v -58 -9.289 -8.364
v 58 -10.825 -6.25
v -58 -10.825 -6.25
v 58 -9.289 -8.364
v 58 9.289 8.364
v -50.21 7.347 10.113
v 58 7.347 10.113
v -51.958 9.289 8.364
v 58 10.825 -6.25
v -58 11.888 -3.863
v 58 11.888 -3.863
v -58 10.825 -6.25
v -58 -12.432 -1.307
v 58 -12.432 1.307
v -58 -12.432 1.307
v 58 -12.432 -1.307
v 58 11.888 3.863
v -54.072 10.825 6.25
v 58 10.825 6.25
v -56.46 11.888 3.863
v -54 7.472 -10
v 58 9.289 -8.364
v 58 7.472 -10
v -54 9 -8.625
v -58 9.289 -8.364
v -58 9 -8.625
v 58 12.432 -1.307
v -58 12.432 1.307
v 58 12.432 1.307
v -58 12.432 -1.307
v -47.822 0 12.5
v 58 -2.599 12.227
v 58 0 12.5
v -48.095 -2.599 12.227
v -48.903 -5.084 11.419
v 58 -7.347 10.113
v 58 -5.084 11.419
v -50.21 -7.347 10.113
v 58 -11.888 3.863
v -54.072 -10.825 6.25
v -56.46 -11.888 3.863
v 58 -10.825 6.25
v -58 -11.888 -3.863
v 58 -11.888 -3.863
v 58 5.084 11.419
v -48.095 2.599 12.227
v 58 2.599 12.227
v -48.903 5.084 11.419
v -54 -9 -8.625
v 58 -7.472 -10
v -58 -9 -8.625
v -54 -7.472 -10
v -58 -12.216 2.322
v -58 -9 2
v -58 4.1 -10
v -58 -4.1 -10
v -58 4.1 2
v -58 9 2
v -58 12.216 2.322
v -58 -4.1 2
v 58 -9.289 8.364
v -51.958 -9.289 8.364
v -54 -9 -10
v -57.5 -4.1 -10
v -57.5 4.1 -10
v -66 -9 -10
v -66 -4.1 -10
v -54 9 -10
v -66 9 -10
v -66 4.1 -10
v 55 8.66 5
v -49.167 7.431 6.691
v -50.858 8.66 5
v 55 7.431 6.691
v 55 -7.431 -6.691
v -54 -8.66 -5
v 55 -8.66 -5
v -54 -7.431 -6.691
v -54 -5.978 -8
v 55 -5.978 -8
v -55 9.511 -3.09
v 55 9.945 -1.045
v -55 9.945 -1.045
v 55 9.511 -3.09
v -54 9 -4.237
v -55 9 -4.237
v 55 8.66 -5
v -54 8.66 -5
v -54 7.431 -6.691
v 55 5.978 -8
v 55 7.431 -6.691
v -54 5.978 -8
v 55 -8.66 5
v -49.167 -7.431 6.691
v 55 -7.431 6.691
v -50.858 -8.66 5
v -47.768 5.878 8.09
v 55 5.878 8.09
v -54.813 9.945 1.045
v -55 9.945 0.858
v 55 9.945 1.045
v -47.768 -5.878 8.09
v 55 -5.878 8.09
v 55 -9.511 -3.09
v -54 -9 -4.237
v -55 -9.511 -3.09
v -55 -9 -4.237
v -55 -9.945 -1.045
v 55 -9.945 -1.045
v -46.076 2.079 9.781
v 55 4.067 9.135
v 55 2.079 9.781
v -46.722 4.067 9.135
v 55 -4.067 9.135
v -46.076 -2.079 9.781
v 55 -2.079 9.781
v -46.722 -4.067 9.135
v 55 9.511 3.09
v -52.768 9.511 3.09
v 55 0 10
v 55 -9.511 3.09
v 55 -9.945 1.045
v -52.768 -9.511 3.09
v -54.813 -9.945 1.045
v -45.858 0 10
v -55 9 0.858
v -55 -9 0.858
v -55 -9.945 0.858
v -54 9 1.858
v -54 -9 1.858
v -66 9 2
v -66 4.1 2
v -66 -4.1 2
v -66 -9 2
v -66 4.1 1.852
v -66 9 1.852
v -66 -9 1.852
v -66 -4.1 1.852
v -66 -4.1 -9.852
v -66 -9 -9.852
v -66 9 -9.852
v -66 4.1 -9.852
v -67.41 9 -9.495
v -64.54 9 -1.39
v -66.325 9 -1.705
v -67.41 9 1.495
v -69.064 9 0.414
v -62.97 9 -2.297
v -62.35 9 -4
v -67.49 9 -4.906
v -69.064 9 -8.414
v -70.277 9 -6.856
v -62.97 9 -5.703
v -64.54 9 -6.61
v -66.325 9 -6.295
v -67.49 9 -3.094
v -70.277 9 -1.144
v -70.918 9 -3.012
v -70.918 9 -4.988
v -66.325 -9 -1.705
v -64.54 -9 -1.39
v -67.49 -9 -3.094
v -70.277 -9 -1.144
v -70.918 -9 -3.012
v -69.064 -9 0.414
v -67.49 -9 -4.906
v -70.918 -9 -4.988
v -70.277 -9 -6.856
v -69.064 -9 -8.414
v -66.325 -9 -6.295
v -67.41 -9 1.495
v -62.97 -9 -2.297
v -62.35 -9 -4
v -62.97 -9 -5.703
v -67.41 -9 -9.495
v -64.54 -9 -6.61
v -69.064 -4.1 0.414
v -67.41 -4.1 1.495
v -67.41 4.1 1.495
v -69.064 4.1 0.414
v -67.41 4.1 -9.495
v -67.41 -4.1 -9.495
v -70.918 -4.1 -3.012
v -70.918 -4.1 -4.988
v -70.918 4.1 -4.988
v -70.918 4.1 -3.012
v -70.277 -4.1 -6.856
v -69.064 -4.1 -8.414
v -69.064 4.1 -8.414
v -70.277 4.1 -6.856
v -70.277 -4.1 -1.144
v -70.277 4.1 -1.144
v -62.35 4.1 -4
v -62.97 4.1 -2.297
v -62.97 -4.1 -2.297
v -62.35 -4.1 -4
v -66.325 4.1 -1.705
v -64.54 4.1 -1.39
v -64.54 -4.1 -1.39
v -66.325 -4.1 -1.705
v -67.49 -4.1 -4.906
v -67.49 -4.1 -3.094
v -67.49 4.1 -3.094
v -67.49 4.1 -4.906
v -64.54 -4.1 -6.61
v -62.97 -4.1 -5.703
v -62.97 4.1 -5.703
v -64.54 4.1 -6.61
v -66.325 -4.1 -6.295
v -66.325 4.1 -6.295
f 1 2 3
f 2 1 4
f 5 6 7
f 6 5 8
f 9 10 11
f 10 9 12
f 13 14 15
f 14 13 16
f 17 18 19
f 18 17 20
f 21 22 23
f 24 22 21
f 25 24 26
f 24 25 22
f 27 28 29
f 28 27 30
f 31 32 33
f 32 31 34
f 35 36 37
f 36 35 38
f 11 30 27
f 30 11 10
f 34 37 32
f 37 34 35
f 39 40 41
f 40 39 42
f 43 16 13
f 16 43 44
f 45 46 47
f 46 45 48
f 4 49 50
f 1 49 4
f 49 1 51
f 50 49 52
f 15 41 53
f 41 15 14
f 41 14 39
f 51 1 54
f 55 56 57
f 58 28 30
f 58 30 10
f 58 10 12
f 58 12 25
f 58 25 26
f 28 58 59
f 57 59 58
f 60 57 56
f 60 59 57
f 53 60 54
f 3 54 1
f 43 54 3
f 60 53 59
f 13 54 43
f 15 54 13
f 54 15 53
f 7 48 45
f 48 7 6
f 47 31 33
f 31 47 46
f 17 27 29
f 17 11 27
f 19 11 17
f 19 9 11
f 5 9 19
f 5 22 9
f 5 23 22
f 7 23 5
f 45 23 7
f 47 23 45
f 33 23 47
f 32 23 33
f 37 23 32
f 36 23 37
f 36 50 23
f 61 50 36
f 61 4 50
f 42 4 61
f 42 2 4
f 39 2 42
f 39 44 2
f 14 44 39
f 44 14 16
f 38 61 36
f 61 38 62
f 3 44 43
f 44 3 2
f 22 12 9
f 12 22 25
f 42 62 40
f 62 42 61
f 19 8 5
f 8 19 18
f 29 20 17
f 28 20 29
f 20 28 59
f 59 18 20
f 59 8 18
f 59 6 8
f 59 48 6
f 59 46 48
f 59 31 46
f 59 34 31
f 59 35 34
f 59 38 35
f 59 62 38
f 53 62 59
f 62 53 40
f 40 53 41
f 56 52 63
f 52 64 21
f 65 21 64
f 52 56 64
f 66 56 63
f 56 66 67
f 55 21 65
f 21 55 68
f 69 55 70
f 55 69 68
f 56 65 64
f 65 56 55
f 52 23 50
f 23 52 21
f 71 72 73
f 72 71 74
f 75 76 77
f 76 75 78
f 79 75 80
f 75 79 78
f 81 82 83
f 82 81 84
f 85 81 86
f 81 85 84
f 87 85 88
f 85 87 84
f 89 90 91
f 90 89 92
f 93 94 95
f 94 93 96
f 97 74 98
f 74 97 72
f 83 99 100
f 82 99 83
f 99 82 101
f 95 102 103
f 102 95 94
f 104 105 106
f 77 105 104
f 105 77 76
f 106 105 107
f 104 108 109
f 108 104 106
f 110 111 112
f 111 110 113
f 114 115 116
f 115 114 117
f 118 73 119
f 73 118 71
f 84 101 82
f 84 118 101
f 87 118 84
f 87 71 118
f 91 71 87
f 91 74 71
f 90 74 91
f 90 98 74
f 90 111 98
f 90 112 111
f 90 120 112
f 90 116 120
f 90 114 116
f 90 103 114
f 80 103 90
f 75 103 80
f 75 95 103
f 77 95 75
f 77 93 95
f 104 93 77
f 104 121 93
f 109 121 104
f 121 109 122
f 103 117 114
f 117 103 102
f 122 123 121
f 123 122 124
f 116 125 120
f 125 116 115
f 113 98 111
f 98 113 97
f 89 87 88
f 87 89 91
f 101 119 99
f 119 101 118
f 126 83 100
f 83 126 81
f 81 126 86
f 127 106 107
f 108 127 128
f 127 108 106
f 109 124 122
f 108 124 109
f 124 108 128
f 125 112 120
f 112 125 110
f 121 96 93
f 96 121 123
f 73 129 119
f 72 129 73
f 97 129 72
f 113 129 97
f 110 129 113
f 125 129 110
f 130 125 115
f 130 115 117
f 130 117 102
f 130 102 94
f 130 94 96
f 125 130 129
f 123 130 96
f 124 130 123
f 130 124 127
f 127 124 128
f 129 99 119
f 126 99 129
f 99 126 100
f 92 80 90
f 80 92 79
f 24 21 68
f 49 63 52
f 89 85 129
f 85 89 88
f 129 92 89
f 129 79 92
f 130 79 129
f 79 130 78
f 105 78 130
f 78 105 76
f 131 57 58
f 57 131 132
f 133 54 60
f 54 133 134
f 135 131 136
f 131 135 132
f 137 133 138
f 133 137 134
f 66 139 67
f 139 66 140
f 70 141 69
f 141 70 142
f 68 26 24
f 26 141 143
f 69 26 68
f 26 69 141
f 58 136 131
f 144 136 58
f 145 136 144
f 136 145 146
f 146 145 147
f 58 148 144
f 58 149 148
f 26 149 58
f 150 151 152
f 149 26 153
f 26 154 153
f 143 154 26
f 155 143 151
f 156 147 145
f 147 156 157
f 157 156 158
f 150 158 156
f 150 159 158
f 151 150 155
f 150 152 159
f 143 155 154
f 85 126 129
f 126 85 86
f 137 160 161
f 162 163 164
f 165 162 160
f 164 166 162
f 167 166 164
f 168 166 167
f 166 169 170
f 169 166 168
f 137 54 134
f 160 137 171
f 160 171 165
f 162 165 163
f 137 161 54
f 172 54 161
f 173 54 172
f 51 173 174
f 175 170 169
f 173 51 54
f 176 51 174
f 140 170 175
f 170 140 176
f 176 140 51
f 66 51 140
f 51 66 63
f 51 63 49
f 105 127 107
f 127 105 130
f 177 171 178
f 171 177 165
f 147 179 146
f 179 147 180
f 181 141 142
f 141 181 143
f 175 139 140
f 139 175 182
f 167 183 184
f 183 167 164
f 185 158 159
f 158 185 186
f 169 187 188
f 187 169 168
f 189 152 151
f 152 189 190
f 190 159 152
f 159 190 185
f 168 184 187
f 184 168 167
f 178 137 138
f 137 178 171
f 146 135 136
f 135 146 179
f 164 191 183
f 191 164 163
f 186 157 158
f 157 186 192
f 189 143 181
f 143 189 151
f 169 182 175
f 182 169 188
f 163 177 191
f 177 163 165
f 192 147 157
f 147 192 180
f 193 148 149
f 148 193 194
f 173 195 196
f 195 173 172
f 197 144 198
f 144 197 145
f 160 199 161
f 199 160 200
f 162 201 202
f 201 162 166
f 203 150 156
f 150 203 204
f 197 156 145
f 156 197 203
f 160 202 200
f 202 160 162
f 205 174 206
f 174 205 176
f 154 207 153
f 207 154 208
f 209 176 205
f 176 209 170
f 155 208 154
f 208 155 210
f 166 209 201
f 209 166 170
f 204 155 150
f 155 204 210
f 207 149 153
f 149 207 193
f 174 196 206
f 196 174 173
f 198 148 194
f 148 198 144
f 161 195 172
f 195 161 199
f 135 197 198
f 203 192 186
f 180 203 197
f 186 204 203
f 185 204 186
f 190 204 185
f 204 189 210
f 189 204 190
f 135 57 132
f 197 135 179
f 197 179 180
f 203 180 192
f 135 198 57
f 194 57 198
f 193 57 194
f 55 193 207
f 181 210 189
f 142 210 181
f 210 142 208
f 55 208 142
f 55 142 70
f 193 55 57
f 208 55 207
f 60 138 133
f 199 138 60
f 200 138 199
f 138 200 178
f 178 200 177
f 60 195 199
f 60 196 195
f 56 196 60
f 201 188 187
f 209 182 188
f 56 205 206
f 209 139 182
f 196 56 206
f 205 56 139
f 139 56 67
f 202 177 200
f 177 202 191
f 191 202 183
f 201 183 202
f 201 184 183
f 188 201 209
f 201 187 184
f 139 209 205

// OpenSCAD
difference() {
difference() {
rotate(90,[0,1,0])
cylinder(h=116,d=25,center=true);
translate([-58,0,20])
rotate(45,[0,1,0])
cube(size=[25,25,25],center=true);
translate([0,0,-15])
cube(size=[118,18,10],center=true);
}
difference() {
translate([0,0,0])
rotate(90,[0,1,0])
cylinder(h=110,d=20,center=true);
translate([-58,0,12])
rotate(45,[0,1,0])
cube(size=[20,20,20],center=true);
translate([0,0,-12])
cube(size=[118,15,8],center=true);
}
}

difference() {
union() {
translate([-60,0,-4])
cube(size=[12,18,12],center=true);
translate([-65,0,-4])
rotate(90,[1,0,0])
cylinder(h=18,d=12,center=true);
}
translate([-65,0,-4]) {
rotate(90,[1,0,0])
cylinder(h=19,d=5.3,center=true);
cube(size=[15,8.2,13],center=true);
}
}
